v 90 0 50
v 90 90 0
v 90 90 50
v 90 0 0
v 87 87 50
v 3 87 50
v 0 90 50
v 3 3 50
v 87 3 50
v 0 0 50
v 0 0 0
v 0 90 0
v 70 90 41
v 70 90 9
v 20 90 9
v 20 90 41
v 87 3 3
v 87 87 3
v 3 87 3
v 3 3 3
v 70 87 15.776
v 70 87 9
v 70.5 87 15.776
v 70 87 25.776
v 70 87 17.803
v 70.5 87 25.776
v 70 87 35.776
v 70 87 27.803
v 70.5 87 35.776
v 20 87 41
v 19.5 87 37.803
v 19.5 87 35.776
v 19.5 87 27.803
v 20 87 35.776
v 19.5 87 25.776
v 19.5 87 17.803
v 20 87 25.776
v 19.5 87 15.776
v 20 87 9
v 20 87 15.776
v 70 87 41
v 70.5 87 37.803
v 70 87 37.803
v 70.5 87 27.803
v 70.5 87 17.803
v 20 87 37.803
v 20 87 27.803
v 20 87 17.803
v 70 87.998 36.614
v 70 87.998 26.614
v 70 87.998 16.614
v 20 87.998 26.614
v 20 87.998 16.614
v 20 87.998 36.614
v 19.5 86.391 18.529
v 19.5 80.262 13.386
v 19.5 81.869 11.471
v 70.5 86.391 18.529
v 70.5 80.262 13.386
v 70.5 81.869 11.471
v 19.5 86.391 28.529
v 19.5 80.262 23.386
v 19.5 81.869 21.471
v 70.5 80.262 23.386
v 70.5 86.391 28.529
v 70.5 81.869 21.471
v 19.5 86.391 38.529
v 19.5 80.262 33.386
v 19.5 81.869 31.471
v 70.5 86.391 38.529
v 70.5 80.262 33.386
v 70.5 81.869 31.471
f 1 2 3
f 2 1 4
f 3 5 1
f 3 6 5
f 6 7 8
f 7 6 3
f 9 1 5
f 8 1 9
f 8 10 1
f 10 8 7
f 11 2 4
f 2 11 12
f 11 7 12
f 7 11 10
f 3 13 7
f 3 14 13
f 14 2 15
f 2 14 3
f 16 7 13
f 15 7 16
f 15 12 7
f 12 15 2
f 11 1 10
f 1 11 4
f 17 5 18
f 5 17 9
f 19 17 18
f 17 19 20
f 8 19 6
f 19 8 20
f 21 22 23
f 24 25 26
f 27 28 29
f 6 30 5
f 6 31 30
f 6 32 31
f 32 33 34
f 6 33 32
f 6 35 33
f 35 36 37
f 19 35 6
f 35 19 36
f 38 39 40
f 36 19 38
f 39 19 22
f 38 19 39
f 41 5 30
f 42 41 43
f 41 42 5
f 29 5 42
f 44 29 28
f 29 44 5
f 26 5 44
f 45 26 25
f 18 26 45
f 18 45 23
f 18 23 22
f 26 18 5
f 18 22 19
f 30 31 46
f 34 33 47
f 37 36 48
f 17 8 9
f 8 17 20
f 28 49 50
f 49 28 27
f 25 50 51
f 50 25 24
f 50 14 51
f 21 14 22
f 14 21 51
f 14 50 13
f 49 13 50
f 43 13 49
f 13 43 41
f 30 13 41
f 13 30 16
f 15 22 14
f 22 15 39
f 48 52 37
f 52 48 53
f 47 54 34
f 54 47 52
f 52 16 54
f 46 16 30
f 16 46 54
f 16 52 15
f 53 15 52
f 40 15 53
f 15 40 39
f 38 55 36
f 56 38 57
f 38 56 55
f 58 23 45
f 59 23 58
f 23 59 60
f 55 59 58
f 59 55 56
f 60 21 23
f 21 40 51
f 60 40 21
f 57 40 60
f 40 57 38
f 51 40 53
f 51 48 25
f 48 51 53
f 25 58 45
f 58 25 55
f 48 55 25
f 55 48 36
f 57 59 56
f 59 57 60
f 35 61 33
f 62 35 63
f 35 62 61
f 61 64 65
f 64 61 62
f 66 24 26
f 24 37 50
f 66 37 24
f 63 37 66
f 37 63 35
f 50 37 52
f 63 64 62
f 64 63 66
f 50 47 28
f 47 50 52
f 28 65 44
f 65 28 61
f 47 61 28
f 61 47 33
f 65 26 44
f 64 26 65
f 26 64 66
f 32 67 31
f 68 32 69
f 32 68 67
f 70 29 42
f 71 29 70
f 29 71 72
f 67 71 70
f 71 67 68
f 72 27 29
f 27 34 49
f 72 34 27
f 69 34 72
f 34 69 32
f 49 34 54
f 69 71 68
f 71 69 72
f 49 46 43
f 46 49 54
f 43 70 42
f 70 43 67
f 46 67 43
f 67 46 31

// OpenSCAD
$fn = 32;

// ----------------------------------------------------------------------
// Vent box: louvers enclosure
// ----------------------------------------------------------------------

// --- parameters (mm) ---
box_l = 90;               // box length, X
box_w = 90;               // box width, Y
box_h = 50;               // box height, Z
wall_t = 3;               // shell wall thickness
win_l = 50;               // vent window width, X
win_h = 32;               // vent window height, Z
slat_t = 2.5;             // louver slat thickness
slat_d = 8;               // louver slat depth
slat_a = 40;              // louver slat angle, degrees
slat_pitch = 10;          // louver pitch
slat_yc = 84.13;          // slat centreline Y

win_z0 = (box_h - win_h) / 2;  // window lower edge Z
n_slats = 3;  // louver count
slat_z0 = win_z0 + (win_h - (n_slats - 1) * slat_pitch) / 2;

difference() {
  union() {
    difference() {
      cube([box_l, box_w, box_h]);
  translate([wall_t, wall_t, wall_t])
    cube([box_l - 2 * wall_t, box_w - 2 * wall_t, box_h]);
  translate([(box_l - win_l) / 2, box_w - wall_t - 1, win_z0])
    cube([win_l, wall_t + 2, win_h]);
    }
    for (i = [0 : n_slats - 1])
      translate([box_l / 2, slat_yc, slat_z0 + i * slat_pitch])
        rotate([slat_a, 0, 0])
          cube([win_l + 1, slat_d, slat_t], center = true);
  }
}
